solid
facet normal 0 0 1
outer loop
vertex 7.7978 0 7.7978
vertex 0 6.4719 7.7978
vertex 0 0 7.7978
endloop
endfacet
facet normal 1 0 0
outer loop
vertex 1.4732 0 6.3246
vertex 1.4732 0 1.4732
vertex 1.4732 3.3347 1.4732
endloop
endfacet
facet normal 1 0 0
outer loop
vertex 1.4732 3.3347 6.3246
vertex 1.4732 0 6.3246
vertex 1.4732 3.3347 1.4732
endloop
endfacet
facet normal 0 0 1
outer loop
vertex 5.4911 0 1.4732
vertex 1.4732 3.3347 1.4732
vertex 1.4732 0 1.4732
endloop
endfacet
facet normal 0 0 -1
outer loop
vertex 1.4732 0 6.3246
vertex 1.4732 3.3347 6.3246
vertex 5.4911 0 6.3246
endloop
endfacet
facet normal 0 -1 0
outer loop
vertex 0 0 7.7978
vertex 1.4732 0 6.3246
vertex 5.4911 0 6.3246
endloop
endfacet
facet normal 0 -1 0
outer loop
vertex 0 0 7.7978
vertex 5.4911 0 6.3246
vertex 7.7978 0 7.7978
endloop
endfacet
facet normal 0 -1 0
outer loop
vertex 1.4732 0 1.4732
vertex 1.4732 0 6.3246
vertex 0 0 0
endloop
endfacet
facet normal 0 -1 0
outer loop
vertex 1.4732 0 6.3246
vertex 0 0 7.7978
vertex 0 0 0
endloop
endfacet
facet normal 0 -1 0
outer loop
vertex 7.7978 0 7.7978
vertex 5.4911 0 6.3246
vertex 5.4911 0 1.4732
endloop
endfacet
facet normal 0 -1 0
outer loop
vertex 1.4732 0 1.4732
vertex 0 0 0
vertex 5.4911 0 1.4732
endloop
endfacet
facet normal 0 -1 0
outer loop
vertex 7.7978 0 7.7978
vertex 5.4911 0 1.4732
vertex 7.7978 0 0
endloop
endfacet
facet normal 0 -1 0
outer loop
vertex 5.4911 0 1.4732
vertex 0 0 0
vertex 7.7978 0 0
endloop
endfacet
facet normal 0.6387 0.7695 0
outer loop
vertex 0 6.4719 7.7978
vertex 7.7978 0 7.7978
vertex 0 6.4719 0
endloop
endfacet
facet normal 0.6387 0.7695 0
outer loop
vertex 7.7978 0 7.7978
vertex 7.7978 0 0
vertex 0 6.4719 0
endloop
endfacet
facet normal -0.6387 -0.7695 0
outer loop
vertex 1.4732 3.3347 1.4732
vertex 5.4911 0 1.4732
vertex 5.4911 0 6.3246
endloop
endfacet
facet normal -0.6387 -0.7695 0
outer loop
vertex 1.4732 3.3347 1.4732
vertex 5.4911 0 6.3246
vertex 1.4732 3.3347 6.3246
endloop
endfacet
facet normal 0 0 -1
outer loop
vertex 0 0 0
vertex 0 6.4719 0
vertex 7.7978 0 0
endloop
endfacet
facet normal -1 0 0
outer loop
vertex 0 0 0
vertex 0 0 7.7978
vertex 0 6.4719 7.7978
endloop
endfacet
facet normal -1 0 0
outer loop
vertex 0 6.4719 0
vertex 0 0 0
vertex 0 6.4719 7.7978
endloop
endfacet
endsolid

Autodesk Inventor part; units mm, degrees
ref_plane "YZ Plane" through (0, 0, 0) normal (1, 0, 0) x (0, 1, 0)
ref_plane "XZ Plane" through (0, 0, 0) normal (0, 1, 0) x (-1, 0, 0)
ref_plane "XY Plane" through (0, 0, 0) normal (0, 0, 1) x (1, 0, 0)
sketch "Sketch1" plane through (0, 0, 0) normal (0, 0, 1) x (1, 0, 0)
  line L0 (0, 0) -> (0, 6.4719)
  line L1 (0, 0) -> (7.7978, 0)
  line L2 (7.7978, 0) -> (0, 6.4719)
  dimension "d0" = 6.4719
  dimension "d1" = 7.7978
extrude "Extrusion1" add sketch "Sketch1" along normal blind 7.7978
shell "Shell1" thickness 1.4732 removed faces 1 at (5.1985, 0, 2.5993)
properties part number "Transparent Grey Peice" material "ABS Plastic"
